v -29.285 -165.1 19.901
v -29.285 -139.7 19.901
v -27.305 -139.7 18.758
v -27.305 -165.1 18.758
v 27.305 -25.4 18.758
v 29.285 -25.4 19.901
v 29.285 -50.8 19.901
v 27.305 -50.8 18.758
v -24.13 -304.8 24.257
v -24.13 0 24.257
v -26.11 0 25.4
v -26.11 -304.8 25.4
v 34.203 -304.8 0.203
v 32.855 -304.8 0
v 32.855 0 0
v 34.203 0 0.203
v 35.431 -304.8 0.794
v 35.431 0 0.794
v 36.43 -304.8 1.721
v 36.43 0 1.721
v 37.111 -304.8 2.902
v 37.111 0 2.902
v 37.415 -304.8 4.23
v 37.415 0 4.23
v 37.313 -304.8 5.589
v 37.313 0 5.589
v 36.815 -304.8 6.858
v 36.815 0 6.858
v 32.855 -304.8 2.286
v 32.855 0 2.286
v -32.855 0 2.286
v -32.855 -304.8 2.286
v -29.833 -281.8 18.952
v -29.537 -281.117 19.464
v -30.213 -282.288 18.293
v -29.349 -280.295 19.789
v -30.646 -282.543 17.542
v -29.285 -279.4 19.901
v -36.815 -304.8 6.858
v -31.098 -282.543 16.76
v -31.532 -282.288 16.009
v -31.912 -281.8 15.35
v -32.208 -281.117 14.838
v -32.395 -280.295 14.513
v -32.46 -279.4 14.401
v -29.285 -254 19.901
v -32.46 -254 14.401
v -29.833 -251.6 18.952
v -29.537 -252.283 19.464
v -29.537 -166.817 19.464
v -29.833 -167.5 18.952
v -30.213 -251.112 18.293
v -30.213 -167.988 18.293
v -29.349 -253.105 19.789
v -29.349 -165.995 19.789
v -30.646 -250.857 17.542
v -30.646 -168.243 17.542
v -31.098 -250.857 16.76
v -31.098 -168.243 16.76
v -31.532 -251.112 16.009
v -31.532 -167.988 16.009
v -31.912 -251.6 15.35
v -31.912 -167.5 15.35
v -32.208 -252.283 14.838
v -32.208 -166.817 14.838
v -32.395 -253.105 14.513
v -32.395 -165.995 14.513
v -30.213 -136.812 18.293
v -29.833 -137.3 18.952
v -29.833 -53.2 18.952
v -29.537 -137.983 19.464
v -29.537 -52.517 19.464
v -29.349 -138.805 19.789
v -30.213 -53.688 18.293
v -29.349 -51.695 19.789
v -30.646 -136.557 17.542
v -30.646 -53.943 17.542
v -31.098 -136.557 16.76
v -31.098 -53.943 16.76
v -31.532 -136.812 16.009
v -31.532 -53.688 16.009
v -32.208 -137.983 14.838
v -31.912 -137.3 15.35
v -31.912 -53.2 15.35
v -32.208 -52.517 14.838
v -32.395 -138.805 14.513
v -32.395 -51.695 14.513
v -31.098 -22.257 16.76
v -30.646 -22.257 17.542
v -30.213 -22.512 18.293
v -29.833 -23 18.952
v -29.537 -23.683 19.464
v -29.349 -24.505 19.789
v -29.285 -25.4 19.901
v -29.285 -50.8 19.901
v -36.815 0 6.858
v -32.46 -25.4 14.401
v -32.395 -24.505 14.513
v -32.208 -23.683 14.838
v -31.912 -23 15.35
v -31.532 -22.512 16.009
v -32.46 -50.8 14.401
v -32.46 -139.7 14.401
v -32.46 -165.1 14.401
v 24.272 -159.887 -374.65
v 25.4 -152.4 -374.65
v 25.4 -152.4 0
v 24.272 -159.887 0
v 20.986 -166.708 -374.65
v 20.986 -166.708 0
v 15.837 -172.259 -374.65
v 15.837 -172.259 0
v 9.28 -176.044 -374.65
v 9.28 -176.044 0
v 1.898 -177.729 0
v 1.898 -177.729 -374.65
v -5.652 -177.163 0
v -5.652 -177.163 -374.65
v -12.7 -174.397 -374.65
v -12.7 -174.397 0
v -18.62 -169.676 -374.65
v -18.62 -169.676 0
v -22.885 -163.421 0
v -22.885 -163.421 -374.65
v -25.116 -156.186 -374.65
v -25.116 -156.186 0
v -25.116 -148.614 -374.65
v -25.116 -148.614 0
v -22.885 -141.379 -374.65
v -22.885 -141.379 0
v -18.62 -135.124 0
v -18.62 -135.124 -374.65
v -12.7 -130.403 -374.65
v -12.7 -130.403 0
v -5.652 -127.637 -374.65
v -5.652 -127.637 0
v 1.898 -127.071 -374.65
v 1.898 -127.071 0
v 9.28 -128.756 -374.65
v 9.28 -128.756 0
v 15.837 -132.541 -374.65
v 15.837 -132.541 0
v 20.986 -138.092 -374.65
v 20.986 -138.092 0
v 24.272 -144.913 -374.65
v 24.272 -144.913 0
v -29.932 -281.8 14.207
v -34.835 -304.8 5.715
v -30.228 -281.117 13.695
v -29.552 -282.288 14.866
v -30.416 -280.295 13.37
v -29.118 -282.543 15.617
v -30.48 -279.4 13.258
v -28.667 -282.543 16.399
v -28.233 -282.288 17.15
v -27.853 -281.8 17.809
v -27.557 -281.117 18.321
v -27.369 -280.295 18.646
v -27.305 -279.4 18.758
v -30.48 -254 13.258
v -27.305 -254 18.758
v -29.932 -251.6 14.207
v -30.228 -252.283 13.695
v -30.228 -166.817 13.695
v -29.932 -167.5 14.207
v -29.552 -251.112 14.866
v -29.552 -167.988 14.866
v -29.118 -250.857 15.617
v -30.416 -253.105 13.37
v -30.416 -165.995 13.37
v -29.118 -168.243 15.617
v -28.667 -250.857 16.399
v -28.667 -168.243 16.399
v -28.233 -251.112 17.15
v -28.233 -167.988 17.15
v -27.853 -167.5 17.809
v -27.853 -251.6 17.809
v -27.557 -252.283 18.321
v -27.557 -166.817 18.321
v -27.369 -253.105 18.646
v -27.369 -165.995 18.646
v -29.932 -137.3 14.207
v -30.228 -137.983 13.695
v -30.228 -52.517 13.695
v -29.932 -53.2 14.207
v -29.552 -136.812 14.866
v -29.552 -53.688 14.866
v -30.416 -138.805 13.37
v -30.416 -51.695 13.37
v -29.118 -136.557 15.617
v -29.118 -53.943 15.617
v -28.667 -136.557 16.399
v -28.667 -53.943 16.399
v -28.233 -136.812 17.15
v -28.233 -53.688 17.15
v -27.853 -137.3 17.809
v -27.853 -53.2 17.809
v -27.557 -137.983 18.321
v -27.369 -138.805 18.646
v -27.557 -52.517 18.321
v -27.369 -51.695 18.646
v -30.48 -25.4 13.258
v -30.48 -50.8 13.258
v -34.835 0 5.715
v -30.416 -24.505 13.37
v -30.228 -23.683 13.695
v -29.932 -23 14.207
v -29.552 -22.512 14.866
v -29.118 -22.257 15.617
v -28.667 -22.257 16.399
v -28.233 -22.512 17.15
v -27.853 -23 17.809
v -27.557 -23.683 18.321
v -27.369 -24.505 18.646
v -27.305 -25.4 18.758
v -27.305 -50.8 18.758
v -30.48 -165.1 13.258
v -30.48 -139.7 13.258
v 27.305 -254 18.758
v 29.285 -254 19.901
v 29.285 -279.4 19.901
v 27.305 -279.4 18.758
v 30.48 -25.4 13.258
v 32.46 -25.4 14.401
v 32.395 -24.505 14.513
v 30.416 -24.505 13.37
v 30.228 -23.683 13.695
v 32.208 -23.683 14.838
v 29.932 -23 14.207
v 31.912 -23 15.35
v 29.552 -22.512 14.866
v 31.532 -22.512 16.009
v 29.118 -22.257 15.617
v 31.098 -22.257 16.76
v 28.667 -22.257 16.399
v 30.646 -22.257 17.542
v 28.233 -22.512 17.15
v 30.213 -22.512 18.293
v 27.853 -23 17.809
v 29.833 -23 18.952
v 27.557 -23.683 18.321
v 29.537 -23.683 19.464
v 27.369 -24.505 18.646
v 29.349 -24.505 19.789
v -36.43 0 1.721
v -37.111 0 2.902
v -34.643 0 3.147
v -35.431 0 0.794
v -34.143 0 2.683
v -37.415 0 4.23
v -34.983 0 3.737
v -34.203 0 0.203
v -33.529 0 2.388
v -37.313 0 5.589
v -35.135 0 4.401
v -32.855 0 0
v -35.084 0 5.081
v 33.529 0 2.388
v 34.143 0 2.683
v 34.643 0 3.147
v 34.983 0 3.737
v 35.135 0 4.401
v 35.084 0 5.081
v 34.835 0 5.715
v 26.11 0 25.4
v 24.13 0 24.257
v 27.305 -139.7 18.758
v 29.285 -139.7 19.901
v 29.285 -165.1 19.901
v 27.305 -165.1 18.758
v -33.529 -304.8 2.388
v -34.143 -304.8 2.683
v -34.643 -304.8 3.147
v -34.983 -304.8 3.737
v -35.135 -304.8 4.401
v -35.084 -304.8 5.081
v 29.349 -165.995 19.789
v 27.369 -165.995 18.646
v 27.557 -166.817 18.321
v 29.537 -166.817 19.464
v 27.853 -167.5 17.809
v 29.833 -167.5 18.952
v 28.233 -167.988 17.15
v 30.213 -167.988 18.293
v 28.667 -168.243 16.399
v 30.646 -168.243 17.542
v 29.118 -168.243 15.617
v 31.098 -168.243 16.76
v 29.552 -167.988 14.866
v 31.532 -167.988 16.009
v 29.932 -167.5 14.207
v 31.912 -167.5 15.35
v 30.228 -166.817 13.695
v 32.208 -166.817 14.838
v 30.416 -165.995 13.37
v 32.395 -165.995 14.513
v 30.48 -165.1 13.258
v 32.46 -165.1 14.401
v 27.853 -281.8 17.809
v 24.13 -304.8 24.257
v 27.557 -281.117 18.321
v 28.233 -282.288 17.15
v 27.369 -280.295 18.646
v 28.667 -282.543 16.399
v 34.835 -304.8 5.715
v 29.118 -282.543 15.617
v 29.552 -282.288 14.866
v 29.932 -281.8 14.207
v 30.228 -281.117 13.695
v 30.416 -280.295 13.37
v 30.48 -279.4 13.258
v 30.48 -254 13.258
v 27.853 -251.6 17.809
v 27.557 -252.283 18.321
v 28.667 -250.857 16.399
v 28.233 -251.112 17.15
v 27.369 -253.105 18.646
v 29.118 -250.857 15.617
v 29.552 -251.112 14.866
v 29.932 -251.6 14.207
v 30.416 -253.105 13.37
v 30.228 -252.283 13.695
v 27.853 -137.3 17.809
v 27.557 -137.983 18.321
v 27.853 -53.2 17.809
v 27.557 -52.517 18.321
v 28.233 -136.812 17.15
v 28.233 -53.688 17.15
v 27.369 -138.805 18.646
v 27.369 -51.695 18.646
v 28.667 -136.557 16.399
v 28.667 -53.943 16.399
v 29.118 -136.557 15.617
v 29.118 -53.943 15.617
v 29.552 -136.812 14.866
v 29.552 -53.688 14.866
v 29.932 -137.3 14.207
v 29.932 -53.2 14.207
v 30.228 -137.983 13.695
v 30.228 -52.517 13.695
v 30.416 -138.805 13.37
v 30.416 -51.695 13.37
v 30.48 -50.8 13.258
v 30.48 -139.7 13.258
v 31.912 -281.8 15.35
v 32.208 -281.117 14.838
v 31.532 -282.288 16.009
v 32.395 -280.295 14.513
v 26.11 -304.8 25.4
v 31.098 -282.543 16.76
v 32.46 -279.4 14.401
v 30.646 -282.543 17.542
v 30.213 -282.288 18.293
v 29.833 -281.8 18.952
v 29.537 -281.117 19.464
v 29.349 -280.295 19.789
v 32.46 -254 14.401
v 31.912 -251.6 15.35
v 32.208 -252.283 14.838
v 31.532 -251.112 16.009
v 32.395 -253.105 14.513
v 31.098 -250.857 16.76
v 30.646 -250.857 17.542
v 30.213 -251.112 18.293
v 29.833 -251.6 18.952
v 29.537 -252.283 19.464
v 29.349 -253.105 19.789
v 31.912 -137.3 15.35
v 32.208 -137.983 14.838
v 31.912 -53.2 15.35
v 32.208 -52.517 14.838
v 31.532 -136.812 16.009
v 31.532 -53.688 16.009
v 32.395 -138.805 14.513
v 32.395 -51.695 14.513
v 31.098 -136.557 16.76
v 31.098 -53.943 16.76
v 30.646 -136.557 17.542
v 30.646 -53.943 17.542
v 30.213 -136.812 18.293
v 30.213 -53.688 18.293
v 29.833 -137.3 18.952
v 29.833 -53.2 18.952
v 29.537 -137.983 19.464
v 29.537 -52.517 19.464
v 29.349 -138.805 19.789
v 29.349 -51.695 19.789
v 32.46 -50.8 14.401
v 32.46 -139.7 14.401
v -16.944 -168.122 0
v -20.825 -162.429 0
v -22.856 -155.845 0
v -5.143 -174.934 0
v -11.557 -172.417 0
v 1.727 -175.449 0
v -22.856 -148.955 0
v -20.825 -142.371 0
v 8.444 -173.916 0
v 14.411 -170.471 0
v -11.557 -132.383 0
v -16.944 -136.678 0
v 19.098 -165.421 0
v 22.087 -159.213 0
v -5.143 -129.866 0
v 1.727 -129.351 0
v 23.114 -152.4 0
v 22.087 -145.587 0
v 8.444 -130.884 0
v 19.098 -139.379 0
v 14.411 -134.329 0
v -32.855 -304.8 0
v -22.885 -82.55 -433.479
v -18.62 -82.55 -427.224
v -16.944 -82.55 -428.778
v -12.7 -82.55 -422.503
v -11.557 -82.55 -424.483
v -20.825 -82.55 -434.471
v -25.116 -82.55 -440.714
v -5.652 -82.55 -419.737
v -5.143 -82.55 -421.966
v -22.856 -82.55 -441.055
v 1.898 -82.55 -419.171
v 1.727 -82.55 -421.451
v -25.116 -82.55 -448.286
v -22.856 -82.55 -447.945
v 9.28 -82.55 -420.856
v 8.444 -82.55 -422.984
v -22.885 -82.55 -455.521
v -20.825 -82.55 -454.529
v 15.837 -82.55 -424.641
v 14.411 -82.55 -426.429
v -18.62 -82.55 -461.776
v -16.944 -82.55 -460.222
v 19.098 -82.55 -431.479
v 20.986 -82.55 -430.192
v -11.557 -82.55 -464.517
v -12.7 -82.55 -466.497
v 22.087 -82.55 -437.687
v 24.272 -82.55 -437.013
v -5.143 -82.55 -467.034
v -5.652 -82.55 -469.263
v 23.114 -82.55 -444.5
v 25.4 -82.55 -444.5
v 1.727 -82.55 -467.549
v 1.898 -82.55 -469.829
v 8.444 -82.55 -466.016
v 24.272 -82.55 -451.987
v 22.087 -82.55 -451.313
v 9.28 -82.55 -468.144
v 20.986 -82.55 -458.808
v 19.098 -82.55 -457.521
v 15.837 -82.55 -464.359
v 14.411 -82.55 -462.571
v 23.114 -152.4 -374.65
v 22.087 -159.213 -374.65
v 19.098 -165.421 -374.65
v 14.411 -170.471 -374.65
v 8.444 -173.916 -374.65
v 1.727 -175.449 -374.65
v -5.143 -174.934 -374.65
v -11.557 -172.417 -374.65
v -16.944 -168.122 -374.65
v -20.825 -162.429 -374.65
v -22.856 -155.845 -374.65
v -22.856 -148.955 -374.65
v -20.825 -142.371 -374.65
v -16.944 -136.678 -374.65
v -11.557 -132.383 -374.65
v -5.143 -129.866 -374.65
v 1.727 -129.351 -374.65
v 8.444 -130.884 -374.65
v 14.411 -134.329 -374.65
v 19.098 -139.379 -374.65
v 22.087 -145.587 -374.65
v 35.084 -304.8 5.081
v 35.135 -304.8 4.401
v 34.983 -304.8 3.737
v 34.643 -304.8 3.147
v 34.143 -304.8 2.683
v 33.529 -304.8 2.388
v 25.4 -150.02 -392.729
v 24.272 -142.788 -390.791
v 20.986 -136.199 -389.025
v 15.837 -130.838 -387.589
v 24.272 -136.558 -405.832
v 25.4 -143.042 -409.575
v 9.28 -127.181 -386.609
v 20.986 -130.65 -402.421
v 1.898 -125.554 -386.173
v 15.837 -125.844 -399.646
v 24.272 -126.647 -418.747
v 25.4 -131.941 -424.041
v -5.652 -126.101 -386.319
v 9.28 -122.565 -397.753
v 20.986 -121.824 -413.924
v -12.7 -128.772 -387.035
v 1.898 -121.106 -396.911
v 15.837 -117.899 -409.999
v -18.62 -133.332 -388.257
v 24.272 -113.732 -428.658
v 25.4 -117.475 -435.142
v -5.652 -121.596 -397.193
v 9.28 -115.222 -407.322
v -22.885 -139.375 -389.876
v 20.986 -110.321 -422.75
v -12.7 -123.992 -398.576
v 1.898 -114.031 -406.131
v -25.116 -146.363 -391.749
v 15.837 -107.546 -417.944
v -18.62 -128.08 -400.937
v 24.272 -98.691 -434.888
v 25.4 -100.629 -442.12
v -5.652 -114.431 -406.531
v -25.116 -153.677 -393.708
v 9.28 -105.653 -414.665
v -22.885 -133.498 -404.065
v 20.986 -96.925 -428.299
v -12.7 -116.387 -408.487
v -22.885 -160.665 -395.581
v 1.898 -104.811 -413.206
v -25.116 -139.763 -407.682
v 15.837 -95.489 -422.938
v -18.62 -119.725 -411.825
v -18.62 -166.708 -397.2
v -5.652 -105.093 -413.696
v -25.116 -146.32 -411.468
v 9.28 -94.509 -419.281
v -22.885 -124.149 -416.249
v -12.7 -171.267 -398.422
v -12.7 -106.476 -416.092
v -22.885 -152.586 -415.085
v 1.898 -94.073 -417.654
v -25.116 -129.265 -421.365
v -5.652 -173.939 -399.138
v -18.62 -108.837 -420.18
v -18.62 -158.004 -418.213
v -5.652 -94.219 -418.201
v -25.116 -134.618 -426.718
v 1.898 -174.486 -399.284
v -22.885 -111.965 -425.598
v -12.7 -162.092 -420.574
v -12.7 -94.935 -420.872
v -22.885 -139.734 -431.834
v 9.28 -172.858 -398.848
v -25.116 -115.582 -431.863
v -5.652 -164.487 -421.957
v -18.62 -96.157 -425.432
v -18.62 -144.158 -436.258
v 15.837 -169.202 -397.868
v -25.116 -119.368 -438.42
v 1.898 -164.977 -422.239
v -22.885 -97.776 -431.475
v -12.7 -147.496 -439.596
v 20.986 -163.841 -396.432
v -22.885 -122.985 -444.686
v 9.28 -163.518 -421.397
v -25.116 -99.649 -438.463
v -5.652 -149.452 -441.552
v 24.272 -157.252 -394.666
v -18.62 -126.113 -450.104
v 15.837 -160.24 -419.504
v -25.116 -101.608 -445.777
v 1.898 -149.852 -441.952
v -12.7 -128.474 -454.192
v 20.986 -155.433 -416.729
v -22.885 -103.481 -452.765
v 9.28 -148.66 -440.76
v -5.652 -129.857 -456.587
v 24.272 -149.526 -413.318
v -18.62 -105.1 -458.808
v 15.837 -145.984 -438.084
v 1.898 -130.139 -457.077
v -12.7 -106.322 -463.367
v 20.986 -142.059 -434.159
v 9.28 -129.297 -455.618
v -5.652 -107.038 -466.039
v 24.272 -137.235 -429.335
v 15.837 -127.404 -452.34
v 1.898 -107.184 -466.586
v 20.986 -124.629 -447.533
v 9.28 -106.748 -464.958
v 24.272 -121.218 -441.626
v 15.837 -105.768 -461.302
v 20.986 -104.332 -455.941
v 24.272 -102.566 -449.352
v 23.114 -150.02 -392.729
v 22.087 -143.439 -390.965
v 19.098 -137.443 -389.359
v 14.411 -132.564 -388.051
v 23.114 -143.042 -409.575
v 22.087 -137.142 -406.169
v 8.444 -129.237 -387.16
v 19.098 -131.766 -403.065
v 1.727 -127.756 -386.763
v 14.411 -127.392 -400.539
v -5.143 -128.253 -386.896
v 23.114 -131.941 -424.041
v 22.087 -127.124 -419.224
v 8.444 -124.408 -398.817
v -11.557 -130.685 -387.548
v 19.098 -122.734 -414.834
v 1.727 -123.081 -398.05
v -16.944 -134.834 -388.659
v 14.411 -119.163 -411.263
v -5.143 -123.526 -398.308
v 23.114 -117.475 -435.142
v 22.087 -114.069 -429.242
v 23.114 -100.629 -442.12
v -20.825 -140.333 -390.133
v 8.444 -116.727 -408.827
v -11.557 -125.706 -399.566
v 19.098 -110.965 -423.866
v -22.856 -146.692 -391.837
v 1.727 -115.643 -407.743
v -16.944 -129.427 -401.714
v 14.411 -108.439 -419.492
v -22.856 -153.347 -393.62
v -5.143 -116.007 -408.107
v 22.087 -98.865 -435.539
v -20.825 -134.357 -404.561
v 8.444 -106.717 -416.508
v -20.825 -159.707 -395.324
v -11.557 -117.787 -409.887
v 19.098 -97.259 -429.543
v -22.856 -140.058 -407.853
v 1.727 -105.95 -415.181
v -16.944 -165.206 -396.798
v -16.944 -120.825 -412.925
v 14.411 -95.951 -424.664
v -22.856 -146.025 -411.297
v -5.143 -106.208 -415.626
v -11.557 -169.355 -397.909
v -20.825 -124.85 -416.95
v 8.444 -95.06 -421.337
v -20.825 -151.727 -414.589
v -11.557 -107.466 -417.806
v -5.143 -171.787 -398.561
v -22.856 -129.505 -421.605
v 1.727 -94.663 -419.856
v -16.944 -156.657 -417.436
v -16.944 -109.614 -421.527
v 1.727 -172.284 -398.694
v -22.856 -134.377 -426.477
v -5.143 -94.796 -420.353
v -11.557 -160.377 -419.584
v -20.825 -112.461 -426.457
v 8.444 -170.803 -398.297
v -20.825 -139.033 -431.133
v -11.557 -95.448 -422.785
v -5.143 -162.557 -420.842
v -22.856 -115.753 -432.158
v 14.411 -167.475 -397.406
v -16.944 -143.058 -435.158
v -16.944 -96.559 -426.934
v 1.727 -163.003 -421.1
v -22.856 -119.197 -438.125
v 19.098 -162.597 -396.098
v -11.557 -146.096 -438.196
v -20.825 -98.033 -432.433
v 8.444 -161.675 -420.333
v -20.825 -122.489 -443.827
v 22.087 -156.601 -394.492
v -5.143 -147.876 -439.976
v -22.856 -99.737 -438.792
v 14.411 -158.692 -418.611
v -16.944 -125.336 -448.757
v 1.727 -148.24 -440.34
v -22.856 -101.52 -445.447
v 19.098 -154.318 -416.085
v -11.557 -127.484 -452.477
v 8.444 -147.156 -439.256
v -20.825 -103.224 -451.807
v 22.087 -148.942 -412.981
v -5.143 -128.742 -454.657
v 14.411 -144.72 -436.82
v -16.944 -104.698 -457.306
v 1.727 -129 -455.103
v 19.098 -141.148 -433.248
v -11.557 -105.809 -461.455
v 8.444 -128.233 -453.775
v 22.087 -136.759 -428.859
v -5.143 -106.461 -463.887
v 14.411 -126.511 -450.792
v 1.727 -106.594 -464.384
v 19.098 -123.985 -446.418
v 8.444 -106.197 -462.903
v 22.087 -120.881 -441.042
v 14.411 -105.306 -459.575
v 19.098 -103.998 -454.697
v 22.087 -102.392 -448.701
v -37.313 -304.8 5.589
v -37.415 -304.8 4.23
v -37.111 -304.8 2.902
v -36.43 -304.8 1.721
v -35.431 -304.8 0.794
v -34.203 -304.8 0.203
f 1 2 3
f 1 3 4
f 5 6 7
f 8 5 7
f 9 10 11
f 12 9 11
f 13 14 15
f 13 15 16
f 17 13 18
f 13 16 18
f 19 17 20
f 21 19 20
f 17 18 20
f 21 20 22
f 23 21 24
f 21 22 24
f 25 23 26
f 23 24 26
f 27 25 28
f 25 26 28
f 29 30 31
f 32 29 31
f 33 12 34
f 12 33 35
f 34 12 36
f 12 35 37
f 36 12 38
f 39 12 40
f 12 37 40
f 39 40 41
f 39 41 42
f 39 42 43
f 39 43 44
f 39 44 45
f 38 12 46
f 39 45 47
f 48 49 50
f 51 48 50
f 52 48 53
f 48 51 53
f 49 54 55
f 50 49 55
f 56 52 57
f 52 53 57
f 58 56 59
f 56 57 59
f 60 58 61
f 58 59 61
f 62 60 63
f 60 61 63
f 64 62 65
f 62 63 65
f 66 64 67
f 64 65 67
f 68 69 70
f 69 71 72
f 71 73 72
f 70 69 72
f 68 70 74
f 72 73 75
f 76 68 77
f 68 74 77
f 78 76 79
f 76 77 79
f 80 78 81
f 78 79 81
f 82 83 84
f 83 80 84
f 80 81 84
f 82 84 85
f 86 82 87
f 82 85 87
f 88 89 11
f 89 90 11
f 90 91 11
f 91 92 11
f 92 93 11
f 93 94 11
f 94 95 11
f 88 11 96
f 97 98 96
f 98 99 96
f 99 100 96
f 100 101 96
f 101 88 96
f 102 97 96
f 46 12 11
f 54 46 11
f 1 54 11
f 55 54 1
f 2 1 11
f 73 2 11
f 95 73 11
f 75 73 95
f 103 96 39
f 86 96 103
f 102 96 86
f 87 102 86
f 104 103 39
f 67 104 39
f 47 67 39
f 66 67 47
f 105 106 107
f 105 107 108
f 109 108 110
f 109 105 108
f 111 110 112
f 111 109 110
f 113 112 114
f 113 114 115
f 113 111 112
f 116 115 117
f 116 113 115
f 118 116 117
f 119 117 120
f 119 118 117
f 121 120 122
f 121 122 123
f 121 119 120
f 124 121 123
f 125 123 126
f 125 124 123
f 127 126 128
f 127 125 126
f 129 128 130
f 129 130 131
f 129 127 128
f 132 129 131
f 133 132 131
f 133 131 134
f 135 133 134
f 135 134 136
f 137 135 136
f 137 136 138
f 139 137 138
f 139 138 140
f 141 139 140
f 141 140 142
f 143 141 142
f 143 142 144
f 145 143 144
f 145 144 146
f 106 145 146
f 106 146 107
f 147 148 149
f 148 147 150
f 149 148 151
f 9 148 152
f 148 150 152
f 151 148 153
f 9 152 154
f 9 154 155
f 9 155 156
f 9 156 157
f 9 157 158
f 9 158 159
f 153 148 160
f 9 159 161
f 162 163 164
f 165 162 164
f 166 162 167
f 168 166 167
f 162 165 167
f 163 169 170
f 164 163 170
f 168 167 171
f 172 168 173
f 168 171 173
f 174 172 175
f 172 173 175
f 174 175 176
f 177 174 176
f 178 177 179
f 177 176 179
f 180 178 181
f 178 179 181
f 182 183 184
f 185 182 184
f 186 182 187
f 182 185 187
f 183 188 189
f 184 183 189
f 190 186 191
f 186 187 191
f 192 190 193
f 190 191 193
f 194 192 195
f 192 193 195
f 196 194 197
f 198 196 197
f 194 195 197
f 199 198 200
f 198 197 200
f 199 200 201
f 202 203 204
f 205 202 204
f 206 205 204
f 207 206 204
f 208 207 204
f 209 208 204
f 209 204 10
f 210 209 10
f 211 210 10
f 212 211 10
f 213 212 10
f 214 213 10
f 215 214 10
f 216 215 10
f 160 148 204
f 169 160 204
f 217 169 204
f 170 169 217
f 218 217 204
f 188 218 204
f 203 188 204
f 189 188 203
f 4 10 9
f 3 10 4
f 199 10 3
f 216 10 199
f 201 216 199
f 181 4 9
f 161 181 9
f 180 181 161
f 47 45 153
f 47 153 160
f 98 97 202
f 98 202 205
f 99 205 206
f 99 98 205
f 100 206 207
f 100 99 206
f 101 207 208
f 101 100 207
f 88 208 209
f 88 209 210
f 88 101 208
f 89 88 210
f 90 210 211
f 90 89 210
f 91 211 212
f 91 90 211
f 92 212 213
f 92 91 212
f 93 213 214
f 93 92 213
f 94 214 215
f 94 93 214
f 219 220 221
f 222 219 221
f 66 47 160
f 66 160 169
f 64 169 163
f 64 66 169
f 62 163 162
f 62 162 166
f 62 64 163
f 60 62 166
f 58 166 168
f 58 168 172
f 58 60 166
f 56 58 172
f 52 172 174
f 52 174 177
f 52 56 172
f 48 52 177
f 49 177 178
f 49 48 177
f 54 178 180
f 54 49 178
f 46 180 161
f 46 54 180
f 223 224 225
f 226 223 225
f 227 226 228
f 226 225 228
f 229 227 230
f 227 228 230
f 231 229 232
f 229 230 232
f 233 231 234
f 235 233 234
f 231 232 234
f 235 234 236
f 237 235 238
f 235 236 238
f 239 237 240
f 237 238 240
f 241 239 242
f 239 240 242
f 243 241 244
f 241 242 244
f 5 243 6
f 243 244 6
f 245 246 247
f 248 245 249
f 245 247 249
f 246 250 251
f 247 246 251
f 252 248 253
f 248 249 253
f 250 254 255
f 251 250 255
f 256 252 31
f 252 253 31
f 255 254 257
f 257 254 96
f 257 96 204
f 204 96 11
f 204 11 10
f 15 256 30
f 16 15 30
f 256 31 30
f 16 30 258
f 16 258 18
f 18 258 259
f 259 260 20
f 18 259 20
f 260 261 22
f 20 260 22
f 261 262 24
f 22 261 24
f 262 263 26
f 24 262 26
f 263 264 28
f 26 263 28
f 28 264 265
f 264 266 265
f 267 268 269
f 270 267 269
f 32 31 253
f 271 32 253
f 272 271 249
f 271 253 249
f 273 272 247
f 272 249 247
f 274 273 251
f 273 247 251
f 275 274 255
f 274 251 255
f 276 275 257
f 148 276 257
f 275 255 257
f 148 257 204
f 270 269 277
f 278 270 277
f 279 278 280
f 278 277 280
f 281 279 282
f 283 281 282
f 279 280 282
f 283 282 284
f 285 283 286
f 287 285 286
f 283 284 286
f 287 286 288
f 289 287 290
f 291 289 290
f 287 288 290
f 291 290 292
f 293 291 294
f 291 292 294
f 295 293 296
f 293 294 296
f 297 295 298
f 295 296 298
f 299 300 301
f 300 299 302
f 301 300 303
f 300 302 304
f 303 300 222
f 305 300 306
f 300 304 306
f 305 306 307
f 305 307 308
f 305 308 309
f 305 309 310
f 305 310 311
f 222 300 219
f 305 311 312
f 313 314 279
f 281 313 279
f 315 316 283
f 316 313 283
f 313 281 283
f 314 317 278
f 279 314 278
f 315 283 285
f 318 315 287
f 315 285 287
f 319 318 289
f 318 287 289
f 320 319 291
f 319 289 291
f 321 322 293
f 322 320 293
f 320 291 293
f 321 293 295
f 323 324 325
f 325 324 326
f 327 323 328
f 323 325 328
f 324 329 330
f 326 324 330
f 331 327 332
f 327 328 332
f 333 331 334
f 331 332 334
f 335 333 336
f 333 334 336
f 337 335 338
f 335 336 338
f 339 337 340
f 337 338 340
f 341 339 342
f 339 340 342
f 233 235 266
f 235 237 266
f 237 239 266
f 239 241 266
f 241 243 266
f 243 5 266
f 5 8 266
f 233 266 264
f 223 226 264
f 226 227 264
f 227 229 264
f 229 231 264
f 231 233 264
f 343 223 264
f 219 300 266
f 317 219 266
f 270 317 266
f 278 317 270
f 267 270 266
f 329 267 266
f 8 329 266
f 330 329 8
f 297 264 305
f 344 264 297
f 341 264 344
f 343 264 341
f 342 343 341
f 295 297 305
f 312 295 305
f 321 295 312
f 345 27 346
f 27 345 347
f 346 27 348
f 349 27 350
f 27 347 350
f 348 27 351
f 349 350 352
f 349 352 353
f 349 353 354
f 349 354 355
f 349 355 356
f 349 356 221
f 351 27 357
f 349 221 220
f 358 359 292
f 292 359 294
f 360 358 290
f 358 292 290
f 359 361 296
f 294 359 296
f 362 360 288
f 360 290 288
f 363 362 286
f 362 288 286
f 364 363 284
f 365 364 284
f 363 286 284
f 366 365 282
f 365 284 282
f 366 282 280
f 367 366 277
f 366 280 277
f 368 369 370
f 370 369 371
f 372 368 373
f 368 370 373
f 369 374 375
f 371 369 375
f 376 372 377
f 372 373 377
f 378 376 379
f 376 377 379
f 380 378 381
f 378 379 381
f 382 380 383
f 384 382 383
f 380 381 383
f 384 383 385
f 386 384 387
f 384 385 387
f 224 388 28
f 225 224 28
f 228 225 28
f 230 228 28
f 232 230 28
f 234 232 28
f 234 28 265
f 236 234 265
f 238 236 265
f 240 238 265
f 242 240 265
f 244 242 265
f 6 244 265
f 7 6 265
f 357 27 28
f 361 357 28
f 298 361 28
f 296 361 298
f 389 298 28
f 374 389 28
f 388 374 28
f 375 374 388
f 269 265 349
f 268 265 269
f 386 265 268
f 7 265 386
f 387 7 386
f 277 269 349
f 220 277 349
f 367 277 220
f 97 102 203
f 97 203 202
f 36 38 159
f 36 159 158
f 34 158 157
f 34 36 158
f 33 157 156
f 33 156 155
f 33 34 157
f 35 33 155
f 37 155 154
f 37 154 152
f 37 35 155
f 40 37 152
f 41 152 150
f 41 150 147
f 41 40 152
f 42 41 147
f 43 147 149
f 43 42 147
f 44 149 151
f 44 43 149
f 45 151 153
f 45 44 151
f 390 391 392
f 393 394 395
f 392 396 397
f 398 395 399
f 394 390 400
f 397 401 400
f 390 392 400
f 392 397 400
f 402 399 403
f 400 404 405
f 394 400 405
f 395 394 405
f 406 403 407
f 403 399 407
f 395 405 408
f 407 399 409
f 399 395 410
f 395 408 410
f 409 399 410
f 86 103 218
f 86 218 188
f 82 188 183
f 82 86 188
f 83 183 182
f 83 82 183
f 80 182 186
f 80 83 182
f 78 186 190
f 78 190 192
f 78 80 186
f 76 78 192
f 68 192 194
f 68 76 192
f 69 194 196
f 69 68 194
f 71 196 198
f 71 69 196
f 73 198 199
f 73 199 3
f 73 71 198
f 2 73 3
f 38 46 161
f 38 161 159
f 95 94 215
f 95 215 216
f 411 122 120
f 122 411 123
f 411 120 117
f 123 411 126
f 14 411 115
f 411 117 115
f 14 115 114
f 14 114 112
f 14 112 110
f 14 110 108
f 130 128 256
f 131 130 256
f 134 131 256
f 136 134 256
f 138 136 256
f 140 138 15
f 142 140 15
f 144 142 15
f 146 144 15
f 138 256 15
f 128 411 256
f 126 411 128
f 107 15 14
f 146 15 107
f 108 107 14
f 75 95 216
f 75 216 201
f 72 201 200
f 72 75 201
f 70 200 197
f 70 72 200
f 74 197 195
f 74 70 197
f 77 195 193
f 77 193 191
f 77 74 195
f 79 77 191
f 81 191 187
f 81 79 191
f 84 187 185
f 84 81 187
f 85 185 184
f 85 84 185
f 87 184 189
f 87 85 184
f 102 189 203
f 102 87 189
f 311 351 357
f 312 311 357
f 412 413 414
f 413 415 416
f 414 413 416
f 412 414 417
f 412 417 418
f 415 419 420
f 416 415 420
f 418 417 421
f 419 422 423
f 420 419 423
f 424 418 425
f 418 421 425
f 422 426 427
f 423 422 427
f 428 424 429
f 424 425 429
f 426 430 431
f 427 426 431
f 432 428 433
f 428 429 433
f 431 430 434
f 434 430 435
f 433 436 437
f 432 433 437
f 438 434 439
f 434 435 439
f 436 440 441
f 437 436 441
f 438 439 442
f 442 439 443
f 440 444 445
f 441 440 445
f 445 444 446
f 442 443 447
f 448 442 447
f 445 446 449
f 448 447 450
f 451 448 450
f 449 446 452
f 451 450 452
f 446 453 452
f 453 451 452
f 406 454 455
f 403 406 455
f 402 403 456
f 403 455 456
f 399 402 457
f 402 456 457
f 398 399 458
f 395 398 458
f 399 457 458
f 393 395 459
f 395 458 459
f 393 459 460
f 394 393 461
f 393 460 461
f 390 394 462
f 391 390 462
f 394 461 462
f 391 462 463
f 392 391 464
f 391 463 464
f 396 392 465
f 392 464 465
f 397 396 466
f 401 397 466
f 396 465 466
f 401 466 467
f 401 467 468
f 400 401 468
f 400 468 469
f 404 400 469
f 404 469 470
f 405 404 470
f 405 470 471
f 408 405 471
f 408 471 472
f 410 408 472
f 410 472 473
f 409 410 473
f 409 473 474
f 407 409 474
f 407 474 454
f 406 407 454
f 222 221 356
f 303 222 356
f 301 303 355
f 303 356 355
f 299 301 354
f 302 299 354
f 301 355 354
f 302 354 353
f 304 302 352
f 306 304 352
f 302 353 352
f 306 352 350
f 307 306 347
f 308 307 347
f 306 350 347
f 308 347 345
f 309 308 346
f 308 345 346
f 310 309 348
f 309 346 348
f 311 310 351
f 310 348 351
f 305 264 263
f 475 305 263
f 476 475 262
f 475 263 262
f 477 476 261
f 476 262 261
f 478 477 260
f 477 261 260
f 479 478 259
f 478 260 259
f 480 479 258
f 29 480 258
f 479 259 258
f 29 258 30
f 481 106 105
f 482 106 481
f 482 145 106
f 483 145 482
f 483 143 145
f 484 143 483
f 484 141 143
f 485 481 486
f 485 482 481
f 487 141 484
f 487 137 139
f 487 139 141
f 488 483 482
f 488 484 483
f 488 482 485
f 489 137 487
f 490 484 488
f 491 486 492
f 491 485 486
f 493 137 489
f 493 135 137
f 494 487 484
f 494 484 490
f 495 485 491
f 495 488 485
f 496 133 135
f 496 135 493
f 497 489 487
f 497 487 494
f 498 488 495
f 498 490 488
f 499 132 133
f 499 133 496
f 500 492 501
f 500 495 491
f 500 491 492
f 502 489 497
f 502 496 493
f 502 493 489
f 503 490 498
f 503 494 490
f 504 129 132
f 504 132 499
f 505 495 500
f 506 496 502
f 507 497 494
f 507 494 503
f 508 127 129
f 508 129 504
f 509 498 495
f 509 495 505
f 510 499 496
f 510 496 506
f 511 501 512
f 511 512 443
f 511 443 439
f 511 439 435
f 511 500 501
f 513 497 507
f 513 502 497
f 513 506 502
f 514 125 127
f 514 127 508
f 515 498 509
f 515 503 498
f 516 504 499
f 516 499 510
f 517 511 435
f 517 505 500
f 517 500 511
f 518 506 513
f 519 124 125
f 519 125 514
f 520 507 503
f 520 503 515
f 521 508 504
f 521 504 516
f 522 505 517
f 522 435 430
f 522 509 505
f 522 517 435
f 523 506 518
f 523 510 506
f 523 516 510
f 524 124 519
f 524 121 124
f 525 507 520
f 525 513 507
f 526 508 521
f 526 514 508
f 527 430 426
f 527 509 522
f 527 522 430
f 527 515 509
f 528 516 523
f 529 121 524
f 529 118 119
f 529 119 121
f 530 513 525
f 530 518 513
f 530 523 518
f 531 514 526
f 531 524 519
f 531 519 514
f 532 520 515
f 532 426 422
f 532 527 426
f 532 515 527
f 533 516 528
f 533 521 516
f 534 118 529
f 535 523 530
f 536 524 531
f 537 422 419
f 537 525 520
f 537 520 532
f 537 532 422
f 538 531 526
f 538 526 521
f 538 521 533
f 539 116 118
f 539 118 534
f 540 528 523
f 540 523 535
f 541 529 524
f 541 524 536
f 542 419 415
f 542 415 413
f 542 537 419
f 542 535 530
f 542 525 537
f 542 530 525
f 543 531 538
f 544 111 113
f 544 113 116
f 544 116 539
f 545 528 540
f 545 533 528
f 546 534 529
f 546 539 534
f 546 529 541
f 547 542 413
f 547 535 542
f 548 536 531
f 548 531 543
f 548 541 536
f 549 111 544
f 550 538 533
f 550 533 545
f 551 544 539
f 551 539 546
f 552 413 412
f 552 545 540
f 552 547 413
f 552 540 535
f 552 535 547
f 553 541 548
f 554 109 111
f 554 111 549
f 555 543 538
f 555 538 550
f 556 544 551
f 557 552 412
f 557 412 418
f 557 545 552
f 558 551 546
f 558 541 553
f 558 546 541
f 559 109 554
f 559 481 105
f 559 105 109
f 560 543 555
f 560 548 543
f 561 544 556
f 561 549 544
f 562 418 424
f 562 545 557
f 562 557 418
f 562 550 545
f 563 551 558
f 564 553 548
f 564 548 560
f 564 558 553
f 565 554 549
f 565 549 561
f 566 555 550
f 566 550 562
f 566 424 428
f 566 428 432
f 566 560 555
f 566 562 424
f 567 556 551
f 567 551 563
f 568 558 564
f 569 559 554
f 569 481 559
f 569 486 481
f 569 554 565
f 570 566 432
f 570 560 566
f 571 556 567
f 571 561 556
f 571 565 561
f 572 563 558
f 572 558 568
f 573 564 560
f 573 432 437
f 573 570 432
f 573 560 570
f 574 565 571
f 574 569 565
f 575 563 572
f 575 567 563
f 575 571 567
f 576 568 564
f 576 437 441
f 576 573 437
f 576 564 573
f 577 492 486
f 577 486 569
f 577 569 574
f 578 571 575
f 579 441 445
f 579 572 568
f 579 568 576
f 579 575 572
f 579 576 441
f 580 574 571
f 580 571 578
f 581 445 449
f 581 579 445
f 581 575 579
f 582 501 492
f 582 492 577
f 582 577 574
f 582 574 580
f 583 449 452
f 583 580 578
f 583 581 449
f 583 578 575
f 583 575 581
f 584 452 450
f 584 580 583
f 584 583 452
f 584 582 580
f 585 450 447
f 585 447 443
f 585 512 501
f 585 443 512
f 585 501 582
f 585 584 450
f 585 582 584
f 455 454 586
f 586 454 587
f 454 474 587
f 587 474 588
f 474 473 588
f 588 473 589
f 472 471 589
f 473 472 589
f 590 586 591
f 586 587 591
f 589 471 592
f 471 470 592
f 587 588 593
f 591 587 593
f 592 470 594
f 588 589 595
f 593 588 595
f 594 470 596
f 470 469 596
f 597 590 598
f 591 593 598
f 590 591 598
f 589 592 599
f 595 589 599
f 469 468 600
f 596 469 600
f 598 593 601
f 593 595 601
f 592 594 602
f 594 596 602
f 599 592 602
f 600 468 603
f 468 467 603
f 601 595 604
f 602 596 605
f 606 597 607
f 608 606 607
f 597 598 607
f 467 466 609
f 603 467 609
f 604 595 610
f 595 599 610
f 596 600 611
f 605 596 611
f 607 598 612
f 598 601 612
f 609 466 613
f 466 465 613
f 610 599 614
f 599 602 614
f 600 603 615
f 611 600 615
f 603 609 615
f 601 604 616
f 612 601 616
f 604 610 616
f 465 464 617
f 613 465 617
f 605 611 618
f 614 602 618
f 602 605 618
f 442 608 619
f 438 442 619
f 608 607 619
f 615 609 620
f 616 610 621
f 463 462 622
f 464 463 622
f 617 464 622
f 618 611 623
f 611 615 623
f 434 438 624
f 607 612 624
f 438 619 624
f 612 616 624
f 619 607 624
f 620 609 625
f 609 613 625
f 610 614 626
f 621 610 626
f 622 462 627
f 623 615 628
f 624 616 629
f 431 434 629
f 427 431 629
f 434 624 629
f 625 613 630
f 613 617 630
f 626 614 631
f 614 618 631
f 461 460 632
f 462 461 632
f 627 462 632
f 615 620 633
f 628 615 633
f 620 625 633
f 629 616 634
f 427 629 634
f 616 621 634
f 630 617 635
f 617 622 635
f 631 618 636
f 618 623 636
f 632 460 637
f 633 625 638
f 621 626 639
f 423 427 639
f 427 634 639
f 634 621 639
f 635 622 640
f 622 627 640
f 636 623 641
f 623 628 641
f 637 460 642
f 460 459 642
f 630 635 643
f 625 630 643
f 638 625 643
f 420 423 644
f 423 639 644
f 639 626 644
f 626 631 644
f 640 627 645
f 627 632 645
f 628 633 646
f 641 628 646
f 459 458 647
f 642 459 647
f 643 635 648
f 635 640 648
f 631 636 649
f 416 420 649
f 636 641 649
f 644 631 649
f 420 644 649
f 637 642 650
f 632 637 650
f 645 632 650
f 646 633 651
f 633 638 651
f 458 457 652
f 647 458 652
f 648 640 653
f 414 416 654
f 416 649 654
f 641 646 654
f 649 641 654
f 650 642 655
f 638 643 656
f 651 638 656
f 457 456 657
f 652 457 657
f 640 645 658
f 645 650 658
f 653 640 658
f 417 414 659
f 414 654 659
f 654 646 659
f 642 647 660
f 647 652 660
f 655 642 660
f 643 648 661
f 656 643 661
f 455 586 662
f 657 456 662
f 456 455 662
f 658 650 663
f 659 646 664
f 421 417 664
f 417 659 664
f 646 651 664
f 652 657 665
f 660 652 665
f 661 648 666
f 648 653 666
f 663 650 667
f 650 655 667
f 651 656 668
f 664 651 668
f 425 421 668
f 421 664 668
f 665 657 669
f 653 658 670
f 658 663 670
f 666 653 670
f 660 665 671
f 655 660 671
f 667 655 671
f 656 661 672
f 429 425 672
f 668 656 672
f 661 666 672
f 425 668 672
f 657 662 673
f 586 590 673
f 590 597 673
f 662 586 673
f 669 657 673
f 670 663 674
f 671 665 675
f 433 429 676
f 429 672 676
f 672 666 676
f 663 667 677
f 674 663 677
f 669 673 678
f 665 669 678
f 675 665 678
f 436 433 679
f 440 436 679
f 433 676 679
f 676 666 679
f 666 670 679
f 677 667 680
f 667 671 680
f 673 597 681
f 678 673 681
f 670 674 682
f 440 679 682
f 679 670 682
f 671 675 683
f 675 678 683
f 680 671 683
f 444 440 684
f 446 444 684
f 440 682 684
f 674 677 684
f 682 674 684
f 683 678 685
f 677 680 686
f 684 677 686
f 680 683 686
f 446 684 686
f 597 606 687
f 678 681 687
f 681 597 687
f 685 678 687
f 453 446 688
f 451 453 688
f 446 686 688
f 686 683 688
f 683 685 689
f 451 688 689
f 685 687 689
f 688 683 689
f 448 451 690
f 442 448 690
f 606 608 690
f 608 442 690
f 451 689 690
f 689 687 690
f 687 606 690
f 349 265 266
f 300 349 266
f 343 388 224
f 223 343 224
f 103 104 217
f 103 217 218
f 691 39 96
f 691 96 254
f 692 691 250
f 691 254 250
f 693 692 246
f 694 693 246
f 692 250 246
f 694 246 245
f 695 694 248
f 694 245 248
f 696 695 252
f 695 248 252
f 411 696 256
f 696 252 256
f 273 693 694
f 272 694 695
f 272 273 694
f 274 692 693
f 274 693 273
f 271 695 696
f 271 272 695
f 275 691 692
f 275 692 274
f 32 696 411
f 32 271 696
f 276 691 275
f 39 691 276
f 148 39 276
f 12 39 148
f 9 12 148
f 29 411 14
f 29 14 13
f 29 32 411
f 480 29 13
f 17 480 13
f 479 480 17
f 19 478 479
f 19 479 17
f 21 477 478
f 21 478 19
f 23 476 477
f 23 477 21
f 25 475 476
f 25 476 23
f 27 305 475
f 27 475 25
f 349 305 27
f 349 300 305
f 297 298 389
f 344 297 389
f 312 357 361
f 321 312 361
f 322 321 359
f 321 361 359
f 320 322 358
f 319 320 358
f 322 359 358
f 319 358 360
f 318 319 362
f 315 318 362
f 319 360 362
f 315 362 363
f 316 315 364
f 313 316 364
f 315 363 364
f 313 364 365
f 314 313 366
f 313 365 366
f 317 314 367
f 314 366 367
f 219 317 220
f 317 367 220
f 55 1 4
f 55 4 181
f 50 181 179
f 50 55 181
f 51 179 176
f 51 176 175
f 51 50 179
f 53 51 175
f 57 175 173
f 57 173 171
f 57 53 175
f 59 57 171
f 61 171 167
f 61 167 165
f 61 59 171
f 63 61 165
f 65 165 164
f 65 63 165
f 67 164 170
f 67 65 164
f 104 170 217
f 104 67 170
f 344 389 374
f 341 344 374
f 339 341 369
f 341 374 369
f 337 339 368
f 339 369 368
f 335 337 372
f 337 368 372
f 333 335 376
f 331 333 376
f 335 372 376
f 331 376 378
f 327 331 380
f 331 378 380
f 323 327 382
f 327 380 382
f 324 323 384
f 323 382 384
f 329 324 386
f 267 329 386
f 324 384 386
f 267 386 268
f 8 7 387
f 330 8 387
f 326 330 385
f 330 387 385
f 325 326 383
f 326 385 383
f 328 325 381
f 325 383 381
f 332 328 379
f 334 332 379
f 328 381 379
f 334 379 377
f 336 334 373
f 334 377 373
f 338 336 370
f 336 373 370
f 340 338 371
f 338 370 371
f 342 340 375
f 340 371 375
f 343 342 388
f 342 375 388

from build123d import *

# Parameters (mm, degrees)
F1_DEPTH = 304.8
F5_R     = 25.4
F5_R_2   = 23.114
F8_DEPTH = 2.286


# Not quite as in the source:
# - a pattern or mirror of a feature is missing from the dataset's text; its kind, count and spacing are read off the source's solid


with BuildPart() as f1:
    # F0 (on Front) → F1 (new body)
    with BuildSketch(Plane.XZ):
        with BuildLine():
            ThreePointArc((-36.8149627644, 6.858), (-36.8149627644, 2.286), (-32.8554946183, 0))
            Line((-32.8554946183, 0), (32.8554946183, 0))
            ThreePointArc((32.8554946183, 0), (36.8149627644, 2.286), (36.8149627644, 6.858))
            Line((36.8149627644, 6.858), (26.1097340731, 25.4))
            Line((26.1097340731, 25.4), (24.13, 24.257))
            Line((24.13, 24.257), (34.8352286913, 5.715))
            ThreePointArc((34.8352286913, 5.715), (34.8352286913, 3.429), (32.8554946183, 2.286))
            Line((32.8554946183, 2.286), (-32.8554946183, 2.286))
            ThreePointArc((-32.8554946183, 2.286), (-34.8352286913, 3.429), (-34.8352286913, 5.715))
            Line((-34.8352286913, 5.715), (-24.13, 24.257))
            Line((-24.13, 24.257), (-26.1097340731, 25.4))
            Line((-26.1097340731, 25.4), (-36.8149627644, 6.858))
        make_face()
    extrude(amount=F1_DEPTH)

    # F6: sweep along a path in F3
    with BuildLine(Plane.YZ) as f6_path:
        Line((-152.4, 0), (-152.4, -374.65))
        ThreePointArc((-152.4, -374.65), (-131.9414086659, -424.0414086659), (-82.55, -444.5))
    # F5 (on plane+point) → F6 (sweep)
    with BuildSketch(Plane.XZ.offset(82.55)):
        with Locations((0, -444.5)):
            Circle(F5_R)
        with Locations((0, -444.5)):
            Circle(F5_R_2, mode=Mode.SUBTRACT)
    sweep(path=f6_path.line)

    # F7 (on face) → F8 (cut, through all)
    with BuildSketch(Plane(origin=(30.5808231829, 0, 17.6558464967), x_dir=(0, 1, 0), z_dir=(0.8660254038, 0, 0.5))):
        with BuildLine():
            Line((-254, 2.5921782196), (-279.4, 2.5921782196))
            ThreePointArc((-279.4, 2.5921782196), (-282.575, -0.5828217804), (-279.4, -3.7578217804))
            Line((-279.4, -3.7578217804), (-254, -3.7578217804))
            ThreePointArc((-254, -3.7578217804), (-250.825, -0.5828217804), (-254, 2.5921782196))
        make_face()
        with BuildLine():
            Line((-139.7, 2.5921782196), (-165.1, 2.5921782196))
            ThreePointArc((-165.1, 2.5921782196), (-168.275, -0.5828217804), (-165.1, -3.7578217804))
            Line((-165.1, -3.7578217804), (-139.7, -3.7578217804))
            ThreePointArc((-139.7, -3.7578217804), (-136.525, -0.5828217804), (-139.7, 2.5921782196))
        make_face()
        with BuildLine():
            ThreePointArc((-25.4, -3.7578217804), (-22.225, -0.5828217804), (-25.4, 2.5921782196))
            Line((-25.4, 2.5921782196), (-50.8, 2.5921782196))
            ThreePointArc((-50.8, 2.5921782196), (-53.975, -0.5828217804), (-50.8, -3.7578217804))
            Line((-50.8, -3.7578217804), (-25.4, -3.7578217804))
        make_face()
    f8 = extrude(amount=-F8_DEPTH, mode=Mode.SUBTRACT)

    # F8_copies: F8 across plane
    add(f8.mirror(Plane(origin=(0, 0, 0), x_dir=(0, 0, -1), z_dir=(-1, 0, 0))), mode=Mode.SUBTRACT)


solid = f1.part
